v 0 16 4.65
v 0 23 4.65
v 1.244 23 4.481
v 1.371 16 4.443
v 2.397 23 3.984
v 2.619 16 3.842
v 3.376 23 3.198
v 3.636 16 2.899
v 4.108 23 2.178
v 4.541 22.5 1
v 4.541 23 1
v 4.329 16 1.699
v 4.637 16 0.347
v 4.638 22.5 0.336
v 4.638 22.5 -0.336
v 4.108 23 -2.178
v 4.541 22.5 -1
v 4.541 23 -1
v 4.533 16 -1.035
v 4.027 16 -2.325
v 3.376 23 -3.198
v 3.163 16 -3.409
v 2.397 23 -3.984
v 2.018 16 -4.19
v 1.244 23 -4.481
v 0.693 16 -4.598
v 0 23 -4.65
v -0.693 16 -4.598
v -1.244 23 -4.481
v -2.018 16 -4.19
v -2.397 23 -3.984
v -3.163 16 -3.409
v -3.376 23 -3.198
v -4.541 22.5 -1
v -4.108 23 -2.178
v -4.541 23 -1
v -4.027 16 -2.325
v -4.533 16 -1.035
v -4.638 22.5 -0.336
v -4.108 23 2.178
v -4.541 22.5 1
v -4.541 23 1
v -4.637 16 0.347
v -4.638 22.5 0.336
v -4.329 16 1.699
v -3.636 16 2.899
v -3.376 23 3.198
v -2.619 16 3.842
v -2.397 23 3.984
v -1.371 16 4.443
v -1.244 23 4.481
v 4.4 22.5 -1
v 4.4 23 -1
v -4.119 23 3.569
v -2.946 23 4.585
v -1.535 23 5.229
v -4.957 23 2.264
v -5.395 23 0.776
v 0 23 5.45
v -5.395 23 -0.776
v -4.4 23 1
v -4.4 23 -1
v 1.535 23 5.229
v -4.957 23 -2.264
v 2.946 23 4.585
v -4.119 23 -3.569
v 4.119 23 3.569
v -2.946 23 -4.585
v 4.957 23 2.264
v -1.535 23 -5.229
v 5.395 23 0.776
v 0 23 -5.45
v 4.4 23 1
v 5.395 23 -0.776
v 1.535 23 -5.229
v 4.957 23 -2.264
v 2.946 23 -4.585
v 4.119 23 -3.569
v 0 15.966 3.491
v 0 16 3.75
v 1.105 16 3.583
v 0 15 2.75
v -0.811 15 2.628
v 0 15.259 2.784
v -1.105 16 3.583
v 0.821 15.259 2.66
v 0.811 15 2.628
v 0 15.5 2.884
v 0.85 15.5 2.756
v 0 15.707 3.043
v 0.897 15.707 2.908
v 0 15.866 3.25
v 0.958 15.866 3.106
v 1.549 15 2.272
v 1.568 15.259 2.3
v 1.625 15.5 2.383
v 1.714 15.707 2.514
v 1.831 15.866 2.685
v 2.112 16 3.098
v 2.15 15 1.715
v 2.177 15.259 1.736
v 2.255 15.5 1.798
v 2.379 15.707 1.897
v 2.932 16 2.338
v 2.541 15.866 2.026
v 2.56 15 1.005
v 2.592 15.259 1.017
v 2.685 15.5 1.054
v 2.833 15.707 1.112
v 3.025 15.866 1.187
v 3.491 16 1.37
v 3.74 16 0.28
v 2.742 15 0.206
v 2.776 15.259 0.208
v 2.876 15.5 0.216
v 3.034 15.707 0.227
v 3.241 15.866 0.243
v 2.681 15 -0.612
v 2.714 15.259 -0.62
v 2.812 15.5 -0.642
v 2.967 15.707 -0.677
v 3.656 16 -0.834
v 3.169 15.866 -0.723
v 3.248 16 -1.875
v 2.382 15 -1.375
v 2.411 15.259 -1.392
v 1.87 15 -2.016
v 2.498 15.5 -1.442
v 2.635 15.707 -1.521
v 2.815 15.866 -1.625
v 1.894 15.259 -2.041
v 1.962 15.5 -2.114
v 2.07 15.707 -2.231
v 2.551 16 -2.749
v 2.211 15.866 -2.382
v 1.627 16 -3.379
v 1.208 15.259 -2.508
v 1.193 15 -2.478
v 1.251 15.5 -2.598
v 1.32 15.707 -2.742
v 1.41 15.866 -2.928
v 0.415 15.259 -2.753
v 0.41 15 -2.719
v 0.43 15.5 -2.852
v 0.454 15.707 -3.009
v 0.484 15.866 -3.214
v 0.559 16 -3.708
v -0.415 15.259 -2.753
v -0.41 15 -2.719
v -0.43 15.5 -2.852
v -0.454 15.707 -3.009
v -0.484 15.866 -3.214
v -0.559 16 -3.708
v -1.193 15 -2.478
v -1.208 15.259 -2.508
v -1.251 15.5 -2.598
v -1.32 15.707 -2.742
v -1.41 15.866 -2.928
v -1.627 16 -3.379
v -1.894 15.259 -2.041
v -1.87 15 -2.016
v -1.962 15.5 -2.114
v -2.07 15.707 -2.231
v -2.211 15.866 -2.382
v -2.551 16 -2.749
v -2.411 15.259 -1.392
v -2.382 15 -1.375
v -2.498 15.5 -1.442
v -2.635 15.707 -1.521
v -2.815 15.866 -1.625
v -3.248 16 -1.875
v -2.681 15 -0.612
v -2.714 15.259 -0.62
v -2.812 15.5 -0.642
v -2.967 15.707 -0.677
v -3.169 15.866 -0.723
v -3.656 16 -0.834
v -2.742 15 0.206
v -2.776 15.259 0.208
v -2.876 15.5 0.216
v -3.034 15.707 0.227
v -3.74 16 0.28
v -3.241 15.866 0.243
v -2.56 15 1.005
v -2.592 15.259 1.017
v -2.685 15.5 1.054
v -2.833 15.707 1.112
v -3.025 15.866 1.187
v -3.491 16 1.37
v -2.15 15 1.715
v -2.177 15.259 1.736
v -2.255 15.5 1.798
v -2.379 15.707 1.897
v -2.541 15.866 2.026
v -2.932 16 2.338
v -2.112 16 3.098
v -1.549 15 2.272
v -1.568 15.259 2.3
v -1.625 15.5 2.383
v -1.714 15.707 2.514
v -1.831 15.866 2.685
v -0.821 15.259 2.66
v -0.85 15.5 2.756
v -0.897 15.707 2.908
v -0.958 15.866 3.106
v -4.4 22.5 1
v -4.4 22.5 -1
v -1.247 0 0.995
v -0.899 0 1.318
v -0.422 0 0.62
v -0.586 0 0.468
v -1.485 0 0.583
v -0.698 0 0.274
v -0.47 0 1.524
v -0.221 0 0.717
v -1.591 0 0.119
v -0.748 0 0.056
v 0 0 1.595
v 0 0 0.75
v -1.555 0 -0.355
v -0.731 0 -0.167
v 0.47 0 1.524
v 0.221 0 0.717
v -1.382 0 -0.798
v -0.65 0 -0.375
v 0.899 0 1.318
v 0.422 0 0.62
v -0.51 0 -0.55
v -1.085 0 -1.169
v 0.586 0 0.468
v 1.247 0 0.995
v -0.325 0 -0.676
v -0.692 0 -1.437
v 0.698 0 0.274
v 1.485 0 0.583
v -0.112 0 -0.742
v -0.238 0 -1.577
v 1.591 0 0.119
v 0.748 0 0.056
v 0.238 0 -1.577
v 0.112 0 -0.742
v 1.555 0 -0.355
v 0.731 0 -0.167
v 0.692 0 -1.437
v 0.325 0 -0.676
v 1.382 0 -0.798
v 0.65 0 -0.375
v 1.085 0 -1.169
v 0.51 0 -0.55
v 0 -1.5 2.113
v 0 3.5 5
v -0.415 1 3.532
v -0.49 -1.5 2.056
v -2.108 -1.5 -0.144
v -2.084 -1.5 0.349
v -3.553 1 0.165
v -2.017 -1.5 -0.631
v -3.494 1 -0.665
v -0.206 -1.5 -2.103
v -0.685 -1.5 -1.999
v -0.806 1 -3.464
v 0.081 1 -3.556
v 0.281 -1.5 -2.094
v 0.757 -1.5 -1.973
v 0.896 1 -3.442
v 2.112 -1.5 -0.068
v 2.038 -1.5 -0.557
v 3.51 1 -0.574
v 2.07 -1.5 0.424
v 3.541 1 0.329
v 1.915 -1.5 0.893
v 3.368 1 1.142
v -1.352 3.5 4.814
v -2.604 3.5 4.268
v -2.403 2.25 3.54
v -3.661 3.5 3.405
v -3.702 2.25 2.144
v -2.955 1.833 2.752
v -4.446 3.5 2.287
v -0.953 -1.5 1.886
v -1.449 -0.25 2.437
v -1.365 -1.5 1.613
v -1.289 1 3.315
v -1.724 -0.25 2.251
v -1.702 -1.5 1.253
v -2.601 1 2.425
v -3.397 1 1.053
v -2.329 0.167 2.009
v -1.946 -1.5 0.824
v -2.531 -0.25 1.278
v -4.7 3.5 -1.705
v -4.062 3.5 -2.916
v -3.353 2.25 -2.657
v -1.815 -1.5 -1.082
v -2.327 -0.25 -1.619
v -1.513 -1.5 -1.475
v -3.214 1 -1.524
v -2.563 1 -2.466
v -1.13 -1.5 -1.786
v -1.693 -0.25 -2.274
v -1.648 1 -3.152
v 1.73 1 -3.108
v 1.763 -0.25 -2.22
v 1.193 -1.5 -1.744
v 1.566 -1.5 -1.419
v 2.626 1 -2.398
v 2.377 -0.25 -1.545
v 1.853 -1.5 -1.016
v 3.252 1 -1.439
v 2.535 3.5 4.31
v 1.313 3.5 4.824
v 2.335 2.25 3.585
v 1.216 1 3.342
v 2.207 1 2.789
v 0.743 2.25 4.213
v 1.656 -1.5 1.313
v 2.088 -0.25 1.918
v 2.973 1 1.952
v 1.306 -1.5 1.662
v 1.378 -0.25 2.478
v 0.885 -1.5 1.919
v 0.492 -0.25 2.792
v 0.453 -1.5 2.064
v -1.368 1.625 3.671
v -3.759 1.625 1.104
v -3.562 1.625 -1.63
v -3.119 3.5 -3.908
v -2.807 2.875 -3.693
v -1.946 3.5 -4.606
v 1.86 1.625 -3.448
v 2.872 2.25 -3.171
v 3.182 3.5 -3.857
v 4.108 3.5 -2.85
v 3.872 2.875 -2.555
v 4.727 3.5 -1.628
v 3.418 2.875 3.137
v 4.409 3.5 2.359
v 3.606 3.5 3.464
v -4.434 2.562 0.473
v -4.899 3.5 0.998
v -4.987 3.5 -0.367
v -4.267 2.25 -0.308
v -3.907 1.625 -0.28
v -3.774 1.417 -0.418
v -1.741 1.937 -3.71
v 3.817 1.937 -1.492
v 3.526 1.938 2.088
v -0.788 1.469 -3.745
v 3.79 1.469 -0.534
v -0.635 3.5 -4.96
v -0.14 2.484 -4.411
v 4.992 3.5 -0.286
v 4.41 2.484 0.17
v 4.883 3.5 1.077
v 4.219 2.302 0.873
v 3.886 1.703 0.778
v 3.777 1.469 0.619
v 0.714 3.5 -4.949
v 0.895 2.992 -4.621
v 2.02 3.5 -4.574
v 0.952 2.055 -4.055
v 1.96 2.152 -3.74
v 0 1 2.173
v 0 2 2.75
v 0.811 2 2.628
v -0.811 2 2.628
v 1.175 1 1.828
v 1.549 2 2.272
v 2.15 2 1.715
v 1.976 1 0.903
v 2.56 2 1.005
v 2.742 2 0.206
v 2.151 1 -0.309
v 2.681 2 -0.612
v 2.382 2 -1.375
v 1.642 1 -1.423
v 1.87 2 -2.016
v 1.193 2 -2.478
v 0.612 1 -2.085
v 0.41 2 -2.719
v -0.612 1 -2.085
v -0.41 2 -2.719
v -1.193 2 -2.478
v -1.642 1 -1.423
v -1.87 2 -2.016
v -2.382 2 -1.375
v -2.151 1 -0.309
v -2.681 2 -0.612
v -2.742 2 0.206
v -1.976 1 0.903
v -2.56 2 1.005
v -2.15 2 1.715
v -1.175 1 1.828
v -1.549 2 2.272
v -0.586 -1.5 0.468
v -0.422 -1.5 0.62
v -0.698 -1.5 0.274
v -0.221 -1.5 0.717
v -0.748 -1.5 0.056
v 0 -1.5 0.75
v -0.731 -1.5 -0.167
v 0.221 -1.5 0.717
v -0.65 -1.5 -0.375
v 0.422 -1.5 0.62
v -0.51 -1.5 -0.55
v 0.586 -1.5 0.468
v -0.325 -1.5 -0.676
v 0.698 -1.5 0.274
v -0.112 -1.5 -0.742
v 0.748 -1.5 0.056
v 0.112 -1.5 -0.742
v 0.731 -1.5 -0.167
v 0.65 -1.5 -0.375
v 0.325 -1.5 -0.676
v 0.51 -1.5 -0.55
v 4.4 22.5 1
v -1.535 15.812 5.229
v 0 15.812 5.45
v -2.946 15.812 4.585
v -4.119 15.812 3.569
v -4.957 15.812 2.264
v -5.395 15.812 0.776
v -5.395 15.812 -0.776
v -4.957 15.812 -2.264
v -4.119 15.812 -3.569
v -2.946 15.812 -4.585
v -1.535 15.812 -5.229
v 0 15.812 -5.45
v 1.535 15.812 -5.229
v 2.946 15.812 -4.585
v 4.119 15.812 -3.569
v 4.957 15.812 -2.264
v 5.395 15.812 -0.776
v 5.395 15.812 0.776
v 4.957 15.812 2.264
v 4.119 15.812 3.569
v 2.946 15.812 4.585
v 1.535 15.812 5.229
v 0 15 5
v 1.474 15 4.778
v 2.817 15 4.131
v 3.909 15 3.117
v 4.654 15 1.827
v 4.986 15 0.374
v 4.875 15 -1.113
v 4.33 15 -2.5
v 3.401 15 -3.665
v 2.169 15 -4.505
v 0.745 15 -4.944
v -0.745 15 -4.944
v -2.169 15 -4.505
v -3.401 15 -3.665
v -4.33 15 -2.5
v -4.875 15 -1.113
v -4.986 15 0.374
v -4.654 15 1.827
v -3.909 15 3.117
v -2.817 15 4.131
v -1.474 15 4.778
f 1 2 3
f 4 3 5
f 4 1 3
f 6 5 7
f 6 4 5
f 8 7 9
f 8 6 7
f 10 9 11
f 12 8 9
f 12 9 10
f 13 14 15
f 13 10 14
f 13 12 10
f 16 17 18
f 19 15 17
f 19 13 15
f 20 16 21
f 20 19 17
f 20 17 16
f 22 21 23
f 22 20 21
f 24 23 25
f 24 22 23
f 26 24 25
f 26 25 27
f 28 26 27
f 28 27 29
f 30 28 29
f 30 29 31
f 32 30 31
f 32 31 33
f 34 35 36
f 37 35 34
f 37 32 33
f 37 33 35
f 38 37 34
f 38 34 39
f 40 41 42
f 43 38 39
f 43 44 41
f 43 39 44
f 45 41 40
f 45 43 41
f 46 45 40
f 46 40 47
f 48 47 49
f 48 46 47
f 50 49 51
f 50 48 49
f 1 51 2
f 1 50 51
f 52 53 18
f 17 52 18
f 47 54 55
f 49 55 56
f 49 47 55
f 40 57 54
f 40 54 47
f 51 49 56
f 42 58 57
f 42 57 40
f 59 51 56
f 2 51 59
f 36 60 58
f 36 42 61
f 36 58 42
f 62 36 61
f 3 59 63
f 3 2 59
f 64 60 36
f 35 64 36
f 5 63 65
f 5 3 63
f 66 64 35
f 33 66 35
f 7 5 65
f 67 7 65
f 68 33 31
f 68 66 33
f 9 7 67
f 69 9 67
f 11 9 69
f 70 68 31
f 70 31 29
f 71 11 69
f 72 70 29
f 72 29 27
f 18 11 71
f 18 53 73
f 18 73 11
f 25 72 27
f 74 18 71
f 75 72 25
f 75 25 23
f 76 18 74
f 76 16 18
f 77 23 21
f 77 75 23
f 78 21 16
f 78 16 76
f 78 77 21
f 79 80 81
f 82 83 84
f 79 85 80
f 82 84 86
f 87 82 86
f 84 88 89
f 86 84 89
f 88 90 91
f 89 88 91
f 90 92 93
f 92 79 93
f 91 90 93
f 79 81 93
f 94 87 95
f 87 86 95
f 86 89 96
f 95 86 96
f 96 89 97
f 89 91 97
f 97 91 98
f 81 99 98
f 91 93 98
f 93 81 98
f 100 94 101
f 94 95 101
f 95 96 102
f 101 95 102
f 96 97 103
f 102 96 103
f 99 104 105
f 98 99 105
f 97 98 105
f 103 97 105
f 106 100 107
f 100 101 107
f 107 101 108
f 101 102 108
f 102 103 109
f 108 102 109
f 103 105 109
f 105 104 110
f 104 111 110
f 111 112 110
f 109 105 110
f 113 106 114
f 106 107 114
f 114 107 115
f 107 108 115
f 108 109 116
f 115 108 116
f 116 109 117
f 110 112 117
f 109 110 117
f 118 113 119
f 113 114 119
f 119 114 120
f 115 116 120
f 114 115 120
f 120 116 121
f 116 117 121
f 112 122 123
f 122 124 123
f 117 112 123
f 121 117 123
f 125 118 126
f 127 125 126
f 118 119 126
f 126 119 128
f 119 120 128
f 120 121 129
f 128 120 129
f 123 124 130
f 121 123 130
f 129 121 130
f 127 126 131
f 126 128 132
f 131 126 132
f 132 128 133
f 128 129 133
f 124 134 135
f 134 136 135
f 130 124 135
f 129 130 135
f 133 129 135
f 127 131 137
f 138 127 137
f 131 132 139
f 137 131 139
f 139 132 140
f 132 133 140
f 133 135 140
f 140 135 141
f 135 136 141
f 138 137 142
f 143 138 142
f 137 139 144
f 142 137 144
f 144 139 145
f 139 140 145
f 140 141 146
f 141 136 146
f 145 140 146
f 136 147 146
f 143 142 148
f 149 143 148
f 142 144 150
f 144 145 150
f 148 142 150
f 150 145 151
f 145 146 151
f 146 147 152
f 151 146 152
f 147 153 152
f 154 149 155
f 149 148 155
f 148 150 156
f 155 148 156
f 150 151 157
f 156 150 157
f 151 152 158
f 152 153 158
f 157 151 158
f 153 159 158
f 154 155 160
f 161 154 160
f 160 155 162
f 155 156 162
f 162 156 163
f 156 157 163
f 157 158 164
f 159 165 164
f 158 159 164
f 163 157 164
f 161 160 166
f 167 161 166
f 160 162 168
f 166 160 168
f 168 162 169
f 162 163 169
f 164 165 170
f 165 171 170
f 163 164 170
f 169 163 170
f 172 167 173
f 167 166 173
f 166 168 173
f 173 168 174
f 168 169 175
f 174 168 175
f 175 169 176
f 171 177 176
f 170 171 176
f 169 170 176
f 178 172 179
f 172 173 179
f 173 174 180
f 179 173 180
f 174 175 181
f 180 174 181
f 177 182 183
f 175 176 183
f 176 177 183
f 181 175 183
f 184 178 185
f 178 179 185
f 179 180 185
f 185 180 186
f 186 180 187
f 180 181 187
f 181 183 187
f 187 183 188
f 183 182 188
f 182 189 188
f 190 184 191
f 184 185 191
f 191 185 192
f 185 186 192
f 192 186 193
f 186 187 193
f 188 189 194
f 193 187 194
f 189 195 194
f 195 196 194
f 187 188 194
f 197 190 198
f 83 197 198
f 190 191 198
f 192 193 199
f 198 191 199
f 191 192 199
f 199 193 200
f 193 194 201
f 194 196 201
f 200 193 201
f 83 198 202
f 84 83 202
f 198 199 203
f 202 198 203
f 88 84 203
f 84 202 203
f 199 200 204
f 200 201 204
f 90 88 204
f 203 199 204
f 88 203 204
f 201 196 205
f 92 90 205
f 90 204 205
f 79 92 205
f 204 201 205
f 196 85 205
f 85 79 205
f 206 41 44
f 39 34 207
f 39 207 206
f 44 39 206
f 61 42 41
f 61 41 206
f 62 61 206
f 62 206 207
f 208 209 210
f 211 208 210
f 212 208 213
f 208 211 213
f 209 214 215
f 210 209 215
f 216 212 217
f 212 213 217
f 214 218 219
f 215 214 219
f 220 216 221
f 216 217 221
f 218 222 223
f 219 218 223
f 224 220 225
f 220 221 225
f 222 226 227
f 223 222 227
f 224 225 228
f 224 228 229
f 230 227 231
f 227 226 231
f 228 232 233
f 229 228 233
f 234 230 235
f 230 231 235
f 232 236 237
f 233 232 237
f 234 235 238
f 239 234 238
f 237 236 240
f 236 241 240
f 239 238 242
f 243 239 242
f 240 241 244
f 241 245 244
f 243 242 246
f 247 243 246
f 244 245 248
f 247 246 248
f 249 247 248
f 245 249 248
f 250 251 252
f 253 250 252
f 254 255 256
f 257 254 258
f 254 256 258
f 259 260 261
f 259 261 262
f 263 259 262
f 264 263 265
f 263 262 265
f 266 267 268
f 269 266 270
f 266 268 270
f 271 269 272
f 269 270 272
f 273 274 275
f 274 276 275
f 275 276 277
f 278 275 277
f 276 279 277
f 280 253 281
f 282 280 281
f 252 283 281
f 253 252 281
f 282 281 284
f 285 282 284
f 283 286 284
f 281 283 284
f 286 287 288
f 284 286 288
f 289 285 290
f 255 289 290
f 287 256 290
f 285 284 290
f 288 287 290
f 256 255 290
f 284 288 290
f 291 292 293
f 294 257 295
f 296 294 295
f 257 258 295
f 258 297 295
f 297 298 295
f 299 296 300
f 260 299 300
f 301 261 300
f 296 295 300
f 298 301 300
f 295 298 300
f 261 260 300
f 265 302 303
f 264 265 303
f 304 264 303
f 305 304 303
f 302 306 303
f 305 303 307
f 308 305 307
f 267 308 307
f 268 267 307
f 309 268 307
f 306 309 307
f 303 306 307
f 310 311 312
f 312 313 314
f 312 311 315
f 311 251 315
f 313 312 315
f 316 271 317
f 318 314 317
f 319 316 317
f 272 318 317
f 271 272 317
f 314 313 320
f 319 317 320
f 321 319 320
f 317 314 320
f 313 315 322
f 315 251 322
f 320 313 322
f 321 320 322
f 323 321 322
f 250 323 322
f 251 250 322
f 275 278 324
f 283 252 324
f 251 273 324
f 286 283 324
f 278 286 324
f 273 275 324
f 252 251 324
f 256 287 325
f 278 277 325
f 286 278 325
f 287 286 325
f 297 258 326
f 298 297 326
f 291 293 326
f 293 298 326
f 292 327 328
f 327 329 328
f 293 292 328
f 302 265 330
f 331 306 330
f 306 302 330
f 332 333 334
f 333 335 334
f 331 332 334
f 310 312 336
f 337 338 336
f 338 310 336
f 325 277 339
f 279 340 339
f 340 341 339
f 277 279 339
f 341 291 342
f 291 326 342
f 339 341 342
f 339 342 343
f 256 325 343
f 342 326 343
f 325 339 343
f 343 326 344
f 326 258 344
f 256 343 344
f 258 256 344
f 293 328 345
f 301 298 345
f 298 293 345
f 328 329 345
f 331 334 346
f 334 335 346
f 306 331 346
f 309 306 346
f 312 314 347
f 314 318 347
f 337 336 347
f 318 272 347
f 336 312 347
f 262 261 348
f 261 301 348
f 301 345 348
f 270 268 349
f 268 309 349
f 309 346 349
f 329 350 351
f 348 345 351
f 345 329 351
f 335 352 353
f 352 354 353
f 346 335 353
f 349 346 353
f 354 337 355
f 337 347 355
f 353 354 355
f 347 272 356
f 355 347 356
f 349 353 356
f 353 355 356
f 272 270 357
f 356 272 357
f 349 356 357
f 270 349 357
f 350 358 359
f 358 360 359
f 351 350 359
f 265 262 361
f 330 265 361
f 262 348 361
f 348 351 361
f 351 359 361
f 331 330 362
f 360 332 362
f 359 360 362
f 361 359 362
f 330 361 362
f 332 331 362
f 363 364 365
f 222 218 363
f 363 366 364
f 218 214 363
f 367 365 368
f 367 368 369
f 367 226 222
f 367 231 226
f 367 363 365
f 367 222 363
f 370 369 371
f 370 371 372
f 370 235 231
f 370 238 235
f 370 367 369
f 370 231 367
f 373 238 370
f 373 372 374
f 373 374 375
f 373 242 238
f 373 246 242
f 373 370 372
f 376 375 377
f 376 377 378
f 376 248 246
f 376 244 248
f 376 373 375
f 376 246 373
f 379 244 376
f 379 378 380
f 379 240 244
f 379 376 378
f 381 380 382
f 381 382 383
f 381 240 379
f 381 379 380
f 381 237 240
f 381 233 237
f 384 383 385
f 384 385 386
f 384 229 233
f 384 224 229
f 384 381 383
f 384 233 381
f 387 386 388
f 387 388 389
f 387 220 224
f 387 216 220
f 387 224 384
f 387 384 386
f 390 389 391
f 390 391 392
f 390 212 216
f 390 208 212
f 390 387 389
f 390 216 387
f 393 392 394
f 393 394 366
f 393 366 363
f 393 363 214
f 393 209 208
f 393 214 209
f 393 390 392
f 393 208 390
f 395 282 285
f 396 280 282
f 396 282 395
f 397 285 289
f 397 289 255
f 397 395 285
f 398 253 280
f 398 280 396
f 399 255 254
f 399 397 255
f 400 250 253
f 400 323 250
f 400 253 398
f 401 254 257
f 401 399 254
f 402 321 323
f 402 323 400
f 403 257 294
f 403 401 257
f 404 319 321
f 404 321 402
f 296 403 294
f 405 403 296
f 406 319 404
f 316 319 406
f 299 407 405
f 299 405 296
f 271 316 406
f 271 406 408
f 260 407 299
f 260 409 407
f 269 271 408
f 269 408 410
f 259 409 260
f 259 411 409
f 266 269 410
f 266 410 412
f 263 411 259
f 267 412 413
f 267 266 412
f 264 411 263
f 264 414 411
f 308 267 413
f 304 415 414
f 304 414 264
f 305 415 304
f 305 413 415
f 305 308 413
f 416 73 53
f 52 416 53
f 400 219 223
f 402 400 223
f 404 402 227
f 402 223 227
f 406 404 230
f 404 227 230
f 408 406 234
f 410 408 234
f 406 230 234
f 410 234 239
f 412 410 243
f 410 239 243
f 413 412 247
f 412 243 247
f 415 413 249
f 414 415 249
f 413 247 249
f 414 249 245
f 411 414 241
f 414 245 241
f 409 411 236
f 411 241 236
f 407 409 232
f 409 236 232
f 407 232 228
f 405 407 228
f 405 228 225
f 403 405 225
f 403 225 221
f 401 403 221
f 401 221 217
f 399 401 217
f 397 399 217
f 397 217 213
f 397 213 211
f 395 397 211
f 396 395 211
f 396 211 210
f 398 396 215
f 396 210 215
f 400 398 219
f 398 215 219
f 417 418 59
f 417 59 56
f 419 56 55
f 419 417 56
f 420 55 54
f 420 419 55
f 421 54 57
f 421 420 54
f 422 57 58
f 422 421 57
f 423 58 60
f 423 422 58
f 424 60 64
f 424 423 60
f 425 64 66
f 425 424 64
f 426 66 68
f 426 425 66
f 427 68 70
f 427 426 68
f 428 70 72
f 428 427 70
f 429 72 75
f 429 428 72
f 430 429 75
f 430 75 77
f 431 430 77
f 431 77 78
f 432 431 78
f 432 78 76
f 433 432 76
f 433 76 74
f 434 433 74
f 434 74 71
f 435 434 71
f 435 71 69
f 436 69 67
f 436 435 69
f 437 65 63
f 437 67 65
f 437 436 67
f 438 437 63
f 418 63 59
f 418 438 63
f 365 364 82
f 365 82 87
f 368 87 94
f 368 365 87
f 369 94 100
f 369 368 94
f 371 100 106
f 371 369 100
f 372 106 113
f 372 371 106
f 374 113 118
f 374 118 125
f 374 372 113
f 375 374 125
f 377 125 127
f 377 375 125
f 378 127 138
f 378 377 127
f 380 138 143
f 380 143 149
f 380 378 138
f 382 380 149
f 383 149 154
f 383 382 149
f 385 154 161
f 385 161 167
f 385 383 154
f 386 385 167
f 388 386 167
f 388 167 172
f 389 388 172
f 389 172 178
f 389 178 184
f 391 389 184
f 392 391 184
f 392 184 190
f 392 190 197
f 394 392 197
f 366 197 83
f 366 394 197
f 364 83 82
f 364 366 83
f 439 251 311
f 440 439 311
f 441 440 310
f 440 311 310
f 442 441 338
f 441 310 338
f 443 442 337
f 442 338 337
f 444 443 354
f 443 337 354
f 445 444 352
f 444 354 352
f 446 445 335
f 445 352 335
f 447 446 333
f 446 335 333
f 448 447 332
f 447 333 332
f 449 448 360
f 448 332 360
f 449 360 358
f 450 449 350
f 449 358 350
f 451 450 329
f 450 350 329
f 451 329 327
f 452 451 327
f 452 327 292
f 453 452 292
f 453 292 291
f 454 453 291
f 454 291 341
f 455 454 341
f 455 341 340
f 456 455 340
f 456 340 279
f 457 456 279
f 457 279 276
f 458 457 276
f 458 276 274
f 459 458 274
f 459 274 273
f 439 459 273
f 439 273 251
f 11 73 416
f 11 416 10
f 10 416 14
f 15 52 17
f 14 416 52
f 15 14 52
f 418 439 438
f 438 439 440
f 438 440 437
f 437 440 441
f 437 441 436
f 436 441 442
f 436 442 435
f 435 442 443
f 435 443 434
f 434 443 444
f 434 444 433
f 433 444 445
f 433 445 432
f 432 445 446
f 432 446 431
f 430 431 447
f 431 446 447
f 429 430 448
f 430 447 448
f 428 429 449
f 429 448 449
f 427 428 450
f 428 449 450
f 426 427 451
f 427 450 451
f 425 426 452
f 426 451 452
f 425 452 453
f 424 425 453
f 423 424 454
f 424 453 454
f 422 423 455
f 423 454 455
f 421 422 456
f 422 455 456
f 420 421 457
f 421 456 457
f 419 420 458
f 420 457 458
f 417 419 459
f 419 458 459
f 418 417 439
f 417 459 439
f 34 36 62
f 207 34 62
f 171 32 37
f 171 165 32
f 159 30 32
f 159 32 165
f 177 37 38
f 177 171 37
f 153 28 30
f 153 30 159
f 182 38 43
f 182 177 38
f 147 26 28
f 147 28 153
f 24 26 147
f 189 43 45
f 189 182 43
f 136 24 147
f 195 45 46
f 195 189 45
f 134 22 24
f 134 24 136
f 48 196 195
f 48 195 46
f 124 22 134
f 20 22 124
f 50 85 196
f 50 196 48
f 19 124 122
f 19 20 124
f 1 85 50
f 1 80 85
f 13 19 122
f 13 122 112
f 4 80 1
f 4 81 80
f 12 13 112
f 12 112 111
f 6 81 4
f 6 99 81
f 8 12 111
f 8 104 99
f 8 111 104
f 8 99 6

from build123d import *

# Parameters (mm, degrees)
SKETCH1_R           = 5
SKETCH1_R_2         = 2.75
BOSS_EXTRUDE1_DEPTH = 16
BOSS_EXTRUDE2_START = 1.5
SKETCH2_R           = 5
BOSS_EXTRUDE2_DEPTH = 1.5
SKETCH3_R           = 0.75
CUT_EXTRUDE1_DEPTH  = 1.5
CHAMFER1_SIZE       = 5
CHAMFER1_SIZE2      = 2.886751346
CHAMFER2_SIZE       = 2
CHAMFER2_SIZE2      = 1.154700538
FILLET1_R           = 1
SKETCH5_R           = 5.45
SKETCH5_R_2         = 4.65
BOSS_EXTRUDE4_DEPTH = 7
CHAMFER4_SIZE       = 0.554309051
CHAMFER4_SIZE_2     = 1
SKETCH6_W           = 0.5
SKETCH6_H           = 2
BOSS_EXTRUDE5_DEPTH = 0.5


with BuildPart() as part:
    # Sketch1 → Boss-Extrude1 (new body)
    with BuildSketch(Plane(origin=(0, 0, 0), x_dir=(1, 0, 0), z_dir=(0, 1, 0))):
        with Locations(Location((0, 0, 0), (0, 0, 270))):
            Circle(SKETCH1_R)
        with Locations(Location((0, 0, 0), (0, 0, 270))):
            Circle(SKETCH1_R_2, mode=Mode.SUBTRACT)
    extrude(amount=BOSS_EXTRUDE1_DEPTH)

    # Sketch2 → Boss-Extrude2 (add)
    with BuildSketch(Plane.XZ.offset(BOSS_EXTRUDE2_START)):
        with Locations(Location((0, 0, 0), (0, 0, 270))):
            Circle(SKETCH2_R)
    extrude(amount=-BOSS_EXTRUDE2_DEPTH)

    # Sketch3 → Cut-Extrude1 (cut)
    with BuildSketch(Plane(origin=(0, 0, 0), x_dir=(1, 0, 0), z_dir=(0, 1, 0))):
        with Locations(Location((0, 0, 0), (0, 0, 270))):
            Circle(SKETCH3_R)
    extrude(amount=-CUT_EXTRUDE1_DEPTH, mode=Mode.SUBTRACT)

    # Chamfer1
    chamfer1_edges = [part.edges().sort_by_distance(p)[0] for p in [
        (0, -1.5, 5),
    ]]
    chamfer1_side = [part.faces().sort_by_distance(p)[0] for p in [
        (0, -0.75, 5),
    ]]
    chamfer(chamfer1_edges, length=CHAMFER1_SIZE, length2=CHAMFER1_SIZE2, reference=chamfer1_side[0])

    # Chamfer2
    chamfer2_edges = [part.edges().sort_by_distance(p)[0] for p in [
        (0, 0, -2.75),
    ]]
    chamfer2_side = [part.faces().sort_by_distance(p)[0] for p in [
        (0, 8, -2.75),
    ]]
    chamfer(chamfer2_edges, length=CHAMFER2_SIZE, length2=CHAMFER2_SIZE2, reference=chamfer2_side[0])

    # Fillet1
    fillet1_edges = [part.edges().sort_by_distance(p)[0] for p in [
        (0, 16, -2.75),
    ]]
    fillet(fillet1_edges, radius=FILLET1_R)

    # Sketch5 → Boss-Extrude4 (add)
    with BuildSketch(Plane(origin=(0, 16, 0), x_dir=(1, 0, 0), z_dir=(0, 1, 0))):
        with Locations(Location((0, 0, 0), (0, 0, 270))):
            Circle(SKETCH5_R)
        with Locations(Location((0, 0, 0), (0, 0, 270))):
            Circle(SKETCH5_R_2, mode=Mode.SUBTRACT)
    extrude(amount=BOSS_EXTRUDE4_DEPTH)

    # Chamfer4
    # the kernel refuses this chamfer: 1, 0.554309051 mm, written as the material it adds along each edge
    with BuildSketch(Plane(origin=(0, 16, 0), x_dir=(0, 0, 1), z_dir=(-1, 0, 0))) as chamfer4_piece_1_section:
        Polygon((5 + CHAMFER4_SIZE, 0), (5, -CHAMFER4_SIZE_2), (5, 0), align=None)
    chamfer4_piece_1 = revolve(axis=Axis((0, 16, 0), (0, 1, 0)), mode=Mode.PRIVATE)
    chamfer4_piece_1 = chamfer4_piece_1 & Plane(origin=(0, 15.398774121, 0), x_dir=(0, 0, 1), z_dir=(0, -1, 0)) * Cylinder(5.45, 23, mode=Mode.PRIVATE)
    add(chamfer4_piece_1)

    # Sketch6 → Boss-Extrude5 (add)
    with BuildSketch(Plane(origin=(0, 23, 0), x_dir=(1, 0, 0), z_dir=(0, 1, 0))):
        with Locations((4.65, 0)):
            Rectangle(SKETCH6_W, SKETCH6_H)
        with Locations((-4.65, 0)):
            Rectangle(SKETCH6_W, SKETCH6_H)
    extrude(amount=-BOSS_EXTRUDE5_DEPTH)


solid = part.part
